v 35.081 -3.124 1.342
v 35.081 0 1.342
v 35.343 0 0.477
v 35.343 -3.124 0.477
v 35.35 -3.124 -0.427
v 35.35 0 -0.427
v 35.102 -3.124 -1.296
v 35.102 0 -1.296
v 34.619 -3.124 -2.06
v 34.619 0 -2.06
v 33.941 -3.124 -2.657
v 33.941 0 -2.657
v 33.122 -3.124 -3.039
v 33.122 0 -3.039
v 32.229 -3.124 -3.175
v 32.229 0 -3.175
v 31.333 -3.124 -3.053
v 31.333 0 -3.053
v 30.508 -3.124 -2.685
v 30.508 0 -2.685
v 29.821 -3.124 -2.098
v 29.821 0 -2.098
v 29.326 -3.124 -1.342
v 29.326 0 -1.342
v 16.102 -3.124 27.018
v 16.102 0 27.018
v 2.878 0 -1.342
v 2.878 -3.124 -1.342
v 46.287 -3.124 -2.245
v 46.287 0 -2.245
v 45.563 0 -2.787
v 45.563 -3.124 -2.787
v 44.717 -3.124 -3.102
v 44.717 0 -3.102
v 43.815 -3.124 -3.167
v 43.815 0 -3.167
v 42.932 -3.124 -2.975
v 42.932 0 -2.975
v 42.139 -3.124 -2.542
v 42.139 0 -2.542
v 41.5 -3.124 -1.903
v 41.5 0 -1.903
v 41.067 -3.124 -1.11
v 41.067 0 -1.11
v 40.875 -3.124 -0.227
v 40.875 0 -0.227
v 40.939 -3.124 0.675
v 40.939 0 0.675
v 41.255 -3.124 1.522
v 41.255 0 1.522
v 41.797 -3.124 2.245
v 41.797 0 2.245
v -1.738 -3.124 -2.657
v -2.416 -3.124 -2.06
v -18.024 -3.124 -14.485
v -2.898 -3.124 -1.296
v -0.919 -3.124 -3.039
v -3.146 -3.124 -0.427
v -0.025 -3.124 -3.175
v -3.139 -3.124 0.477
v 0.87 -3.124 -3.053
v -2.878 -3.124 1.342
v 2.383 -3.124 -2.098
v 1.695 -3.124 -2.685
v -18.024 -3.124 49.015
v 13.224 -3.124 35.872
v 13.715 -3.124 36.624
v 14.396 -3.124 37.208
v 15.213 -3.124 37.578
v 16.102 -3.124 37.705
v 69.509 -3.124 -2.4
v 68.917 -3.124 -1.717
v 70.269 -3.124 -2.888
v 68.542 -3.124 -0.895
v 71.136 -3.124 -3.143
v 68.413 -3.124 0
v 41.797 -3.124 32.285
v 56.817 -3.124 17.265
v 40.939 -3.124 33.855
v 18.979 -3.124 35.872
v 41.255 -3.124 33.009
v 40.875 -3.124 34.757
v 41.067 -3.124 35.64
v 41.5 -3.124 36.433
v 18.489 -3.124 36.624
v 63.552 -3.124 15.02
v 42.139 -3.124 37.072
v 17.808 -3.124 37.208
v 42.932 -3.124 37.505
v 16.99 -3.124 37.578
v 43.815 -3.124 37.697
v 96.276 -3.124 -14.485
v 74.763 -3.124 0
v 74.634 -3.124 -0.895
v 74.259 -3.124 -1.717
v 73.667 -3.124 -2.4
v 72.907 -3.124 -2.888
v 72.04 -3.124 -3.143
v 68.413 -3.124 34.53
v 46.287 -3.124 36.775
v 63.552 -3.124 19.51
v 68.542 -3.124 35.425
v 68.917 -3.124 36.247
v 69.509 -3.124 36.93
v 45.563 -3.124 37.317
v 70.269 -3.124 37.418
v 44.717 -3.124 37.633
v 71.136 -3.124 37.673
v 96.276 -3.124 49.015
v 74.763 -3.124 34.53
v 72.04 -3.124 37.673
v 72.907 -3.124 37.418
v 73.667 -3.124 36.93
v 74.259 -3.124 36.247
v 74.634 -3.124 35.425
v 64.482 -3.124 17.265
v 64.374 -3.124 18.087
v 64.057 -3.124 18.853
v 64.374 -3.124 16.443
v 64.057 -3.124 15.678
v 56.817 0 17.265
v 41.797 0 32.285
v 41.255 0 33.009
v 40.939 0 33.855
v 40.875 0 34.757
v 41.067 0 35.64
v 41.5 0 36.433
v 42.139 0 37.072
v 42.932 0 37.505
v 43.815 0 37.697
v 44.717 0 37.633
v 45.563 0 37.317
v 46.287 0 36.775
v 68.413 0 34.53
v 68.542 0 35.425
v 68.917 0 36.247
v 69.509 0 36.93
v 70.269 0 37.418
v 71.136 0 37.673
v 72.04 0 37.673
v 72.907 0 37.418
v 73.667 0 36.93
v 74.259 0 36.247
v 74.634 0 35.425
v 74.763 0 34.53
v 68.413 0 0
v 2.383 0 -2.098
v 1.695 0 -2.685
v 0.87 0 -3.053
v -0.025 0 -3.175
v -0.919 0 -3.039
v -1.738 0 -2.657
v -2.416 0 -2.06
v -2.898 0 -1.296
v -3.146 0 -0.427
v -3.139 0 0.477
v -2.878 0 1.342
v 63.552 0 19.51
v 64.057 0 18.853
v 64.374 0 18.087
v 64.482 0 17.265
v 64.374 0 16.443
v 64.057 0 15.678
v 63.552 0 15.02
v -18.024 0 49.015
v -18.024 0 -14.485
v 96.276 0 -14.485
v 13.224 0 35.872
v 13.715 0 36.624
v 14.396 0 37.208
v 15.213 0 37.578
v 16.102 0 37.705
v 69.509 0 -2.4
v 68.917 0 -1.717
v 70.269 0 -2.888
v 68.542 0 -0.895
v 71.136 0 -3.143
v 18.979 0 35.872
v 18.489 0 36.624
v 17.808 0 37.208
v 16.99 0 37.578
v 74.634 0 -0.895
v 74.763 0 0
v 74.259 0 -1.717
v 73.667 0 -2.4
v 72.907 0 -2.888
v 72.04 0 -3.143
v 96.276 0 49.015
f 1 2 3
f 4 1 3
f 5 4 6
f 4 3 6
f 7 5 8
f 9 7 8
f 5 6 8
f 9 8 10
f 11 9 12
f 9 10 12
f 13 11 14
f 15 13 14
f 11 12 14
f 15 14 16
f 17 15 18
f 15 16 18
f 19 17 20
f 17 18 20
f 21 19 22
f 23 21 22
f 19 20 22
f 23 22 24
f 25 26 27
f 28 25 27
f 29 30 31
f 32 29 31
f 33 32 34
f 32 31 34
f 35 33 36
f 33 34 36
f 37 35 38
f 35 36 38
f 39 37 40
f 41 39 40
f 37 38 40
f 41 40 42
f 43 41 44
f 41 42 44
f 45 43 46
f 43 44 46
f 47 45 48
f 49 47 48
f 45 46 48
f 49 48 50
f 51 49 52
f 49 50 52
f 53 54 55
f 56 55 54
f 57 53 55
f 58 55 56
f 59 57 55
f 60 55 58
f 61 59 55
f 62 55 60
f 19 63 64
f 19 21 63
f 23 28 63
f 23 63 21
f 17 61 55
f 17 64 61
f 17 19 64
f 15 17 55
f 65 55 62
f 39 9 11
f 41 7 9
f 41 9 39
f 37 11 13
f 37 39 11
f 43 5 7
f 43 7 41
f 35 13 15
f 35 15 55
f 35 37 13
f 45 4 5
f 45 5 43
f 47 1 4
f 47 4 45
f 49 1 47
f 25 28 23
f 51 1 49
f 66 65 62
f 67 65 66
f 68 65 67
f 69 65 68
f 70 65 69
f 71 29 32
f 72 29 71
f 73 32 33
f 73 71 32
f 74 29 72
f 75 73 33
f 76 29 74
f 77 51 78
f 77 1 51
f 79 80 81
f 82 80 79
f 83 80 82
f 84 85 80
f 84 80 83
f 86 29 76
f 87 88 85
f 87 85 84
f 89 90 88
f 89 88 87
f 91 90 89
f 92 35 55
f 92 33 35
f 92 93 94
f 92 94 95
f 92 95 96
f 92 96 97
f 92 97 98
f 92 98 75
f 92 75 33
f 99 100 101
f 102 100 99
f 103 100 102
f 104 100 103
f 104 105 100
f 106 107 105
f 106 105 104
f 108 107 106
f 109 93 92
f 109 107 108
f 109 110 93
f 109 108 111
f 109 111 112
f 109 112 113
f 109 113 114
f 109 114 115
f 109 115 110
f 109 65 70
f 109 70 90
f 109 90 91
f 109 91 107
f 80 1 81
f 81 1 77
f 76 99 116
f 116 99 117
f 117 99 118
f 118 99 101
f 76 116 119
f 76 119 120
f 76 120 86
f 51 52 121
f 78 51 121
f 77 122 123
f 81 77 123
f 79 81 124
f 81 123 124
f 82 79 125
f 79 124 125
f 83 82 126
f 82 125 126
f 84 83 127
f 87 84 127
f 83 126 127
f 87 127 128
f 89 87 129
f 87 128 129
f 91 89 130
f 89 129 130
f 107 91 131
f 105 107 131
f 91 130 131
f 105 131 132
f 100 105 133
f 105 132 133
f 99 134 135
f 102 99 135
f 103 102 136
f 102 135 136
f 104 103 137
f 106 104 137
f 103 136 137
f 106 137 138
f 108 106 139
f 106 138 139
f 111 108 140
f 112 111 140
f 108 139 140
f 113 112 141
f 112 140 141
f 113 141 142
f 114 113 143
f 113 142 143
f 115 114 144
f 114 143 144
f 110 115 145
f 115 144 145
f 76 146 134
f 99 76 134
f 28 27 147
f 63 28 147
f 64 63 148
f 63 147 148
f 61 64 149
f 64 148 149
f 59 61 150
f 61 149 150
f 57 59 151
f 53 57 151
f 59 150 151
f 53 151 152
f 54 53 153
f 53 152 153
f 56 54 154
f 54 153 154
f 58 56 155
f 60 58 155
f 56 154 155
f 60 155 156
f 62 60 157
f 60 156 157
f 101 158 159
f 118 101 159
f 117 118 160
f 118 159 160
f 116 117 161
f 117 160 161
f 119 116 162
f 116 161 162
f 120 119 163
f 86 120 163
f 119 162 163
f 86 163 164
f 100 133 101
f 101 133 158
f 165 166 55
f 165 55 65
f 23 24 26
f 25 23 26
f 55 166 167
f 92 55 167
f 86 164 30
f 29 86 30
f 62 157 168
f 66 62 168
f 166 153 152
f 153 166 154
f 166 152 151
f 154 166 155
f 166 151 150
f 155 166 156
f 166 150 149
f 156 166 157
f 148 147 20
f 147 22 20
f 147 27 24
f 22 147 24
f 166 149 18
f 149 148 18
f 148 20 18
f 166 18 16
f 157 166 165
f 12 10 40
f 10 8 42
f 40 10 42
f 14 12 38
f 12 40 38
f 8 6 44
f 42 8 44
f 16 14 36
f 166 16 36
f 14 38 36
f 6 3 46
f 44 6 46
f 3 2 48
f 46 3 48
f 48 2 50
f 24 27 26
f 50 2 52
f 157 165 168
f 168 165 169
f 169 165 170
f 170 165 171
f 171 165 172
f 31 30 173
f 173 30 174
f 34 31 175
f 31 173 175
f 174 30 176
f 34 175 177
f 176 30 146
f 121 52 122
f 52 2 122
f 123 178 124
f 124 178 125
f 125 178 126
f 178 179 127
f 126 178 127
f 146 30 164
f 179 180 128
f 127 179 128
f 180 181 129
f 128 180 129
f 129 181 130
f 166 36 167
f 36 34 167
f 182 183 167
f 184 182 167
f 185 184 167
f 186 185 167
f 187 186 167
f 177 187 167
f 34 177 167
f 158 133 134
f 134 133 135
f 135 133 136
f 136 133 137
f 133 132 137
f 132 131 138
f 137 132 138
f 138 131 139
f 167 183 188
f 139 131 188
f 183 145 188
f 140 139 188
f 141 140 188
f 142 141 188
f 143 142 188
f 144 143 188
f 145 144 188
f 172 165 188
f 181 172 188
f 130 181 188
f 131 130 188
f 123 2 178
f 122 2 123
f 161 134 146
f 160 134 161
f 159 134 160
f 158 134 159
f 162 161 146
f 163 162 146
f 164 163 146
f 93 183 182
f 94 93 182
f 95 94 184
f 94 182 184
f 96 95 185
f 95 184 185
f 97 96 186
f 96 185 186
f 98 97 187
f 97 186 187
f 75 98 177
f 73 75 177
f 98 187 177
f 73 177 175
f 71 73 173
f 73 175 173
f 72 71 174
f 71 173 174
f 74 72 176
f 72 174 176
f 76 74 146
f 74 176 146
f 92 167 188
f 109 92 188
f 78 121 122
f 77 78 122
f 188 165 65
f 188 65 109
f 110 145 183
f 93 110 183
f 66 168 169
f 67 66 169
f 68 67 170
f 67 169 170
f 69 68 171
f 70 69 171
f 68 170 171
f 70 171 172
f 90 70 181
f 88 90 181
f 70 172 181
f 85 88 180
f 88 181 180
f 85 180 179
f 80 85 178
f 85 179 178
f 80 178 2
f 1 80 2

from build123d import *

# Parameters (mm, degrees)
F0_W     = 114.3
F0_H     = 63.5
F1_DEPTH = 3.1242


with BuildPart() as f1:
    # F0 (on Front) → F1 (new body)
    with BuildSketch(Plane.XZ):
        with Locations((39.126127, 17.265163)):
            Rectangle(F0_W, F0_H)
        with BuildLine():
            ThreePointArc((46.28682, -2.245064), (41.796692, -2.245064), (41.796692, 2.245064))
            Line((41.796692, 2.245064), (56.816791, 17.265163))
            Line((56.816791, 17.265163), (41.796692, 32.285263))
            ThreePointArc((41.796692, 32.285263), (41.796692, 36.775391), (46.28682, 36.775391))
            Line((46.28682, 36.775391), (63.551983, 19.510227))
            ThreePointArc((63.551983, 19.510227), (64.481919, 17.265163), (63.551983, 15.020099))
            Line((63.551983, 15.020099), (46.28682, -2.245064))
        make_face(mode=Mode.SUBTRACT)
        with BuildLine():
            ThreePointArc((74.762899, 0), (71.587899, -3.175), (68.412899, 0))
            Line((68.412899, 0), (68.412899, 17.265163))
            Line((68.412899, 17.265163), (68.412899, 34.530327))
            ThreePointArc((68.412899, 34.530327), (71.587899, 37.705327), (74.762899, 34.530327))
            Line((74.762899, 34.530327), (74.762899, 17.265163))
            Line((74.762899, 17.265163), (74.762899, 0))
        make_face(mode=Mode.SUBTRACT)
        with BuildLine():
            ThreePointArc((2.877527, -1.341813), (-1.341813, -2.877527), (-2.877527, 1.341813))
            Line((-2.877527, 1.341813), (13.224229, 35.87214))
            ThreePointArc((13.224229, 35.87214), (16.101756, 37.705327), (18.979283, 35.87214))
            Line((18.979283, 35.87214), (35.081039, 1.341813))
            ThreePointArc((35.081039, 1.341813), (33.545325, -2.877527), (29.325984, -1.341813))
            Line((29.325984, -1.341813), (16.101756, 27.017637))
            Line((16.101756, 27.017637), (2.877527, -1.341813))
        make_face(mode=Mode.SUBTRACT)
    extrude(amount=F1_DEPTH)


solid = f1.part
